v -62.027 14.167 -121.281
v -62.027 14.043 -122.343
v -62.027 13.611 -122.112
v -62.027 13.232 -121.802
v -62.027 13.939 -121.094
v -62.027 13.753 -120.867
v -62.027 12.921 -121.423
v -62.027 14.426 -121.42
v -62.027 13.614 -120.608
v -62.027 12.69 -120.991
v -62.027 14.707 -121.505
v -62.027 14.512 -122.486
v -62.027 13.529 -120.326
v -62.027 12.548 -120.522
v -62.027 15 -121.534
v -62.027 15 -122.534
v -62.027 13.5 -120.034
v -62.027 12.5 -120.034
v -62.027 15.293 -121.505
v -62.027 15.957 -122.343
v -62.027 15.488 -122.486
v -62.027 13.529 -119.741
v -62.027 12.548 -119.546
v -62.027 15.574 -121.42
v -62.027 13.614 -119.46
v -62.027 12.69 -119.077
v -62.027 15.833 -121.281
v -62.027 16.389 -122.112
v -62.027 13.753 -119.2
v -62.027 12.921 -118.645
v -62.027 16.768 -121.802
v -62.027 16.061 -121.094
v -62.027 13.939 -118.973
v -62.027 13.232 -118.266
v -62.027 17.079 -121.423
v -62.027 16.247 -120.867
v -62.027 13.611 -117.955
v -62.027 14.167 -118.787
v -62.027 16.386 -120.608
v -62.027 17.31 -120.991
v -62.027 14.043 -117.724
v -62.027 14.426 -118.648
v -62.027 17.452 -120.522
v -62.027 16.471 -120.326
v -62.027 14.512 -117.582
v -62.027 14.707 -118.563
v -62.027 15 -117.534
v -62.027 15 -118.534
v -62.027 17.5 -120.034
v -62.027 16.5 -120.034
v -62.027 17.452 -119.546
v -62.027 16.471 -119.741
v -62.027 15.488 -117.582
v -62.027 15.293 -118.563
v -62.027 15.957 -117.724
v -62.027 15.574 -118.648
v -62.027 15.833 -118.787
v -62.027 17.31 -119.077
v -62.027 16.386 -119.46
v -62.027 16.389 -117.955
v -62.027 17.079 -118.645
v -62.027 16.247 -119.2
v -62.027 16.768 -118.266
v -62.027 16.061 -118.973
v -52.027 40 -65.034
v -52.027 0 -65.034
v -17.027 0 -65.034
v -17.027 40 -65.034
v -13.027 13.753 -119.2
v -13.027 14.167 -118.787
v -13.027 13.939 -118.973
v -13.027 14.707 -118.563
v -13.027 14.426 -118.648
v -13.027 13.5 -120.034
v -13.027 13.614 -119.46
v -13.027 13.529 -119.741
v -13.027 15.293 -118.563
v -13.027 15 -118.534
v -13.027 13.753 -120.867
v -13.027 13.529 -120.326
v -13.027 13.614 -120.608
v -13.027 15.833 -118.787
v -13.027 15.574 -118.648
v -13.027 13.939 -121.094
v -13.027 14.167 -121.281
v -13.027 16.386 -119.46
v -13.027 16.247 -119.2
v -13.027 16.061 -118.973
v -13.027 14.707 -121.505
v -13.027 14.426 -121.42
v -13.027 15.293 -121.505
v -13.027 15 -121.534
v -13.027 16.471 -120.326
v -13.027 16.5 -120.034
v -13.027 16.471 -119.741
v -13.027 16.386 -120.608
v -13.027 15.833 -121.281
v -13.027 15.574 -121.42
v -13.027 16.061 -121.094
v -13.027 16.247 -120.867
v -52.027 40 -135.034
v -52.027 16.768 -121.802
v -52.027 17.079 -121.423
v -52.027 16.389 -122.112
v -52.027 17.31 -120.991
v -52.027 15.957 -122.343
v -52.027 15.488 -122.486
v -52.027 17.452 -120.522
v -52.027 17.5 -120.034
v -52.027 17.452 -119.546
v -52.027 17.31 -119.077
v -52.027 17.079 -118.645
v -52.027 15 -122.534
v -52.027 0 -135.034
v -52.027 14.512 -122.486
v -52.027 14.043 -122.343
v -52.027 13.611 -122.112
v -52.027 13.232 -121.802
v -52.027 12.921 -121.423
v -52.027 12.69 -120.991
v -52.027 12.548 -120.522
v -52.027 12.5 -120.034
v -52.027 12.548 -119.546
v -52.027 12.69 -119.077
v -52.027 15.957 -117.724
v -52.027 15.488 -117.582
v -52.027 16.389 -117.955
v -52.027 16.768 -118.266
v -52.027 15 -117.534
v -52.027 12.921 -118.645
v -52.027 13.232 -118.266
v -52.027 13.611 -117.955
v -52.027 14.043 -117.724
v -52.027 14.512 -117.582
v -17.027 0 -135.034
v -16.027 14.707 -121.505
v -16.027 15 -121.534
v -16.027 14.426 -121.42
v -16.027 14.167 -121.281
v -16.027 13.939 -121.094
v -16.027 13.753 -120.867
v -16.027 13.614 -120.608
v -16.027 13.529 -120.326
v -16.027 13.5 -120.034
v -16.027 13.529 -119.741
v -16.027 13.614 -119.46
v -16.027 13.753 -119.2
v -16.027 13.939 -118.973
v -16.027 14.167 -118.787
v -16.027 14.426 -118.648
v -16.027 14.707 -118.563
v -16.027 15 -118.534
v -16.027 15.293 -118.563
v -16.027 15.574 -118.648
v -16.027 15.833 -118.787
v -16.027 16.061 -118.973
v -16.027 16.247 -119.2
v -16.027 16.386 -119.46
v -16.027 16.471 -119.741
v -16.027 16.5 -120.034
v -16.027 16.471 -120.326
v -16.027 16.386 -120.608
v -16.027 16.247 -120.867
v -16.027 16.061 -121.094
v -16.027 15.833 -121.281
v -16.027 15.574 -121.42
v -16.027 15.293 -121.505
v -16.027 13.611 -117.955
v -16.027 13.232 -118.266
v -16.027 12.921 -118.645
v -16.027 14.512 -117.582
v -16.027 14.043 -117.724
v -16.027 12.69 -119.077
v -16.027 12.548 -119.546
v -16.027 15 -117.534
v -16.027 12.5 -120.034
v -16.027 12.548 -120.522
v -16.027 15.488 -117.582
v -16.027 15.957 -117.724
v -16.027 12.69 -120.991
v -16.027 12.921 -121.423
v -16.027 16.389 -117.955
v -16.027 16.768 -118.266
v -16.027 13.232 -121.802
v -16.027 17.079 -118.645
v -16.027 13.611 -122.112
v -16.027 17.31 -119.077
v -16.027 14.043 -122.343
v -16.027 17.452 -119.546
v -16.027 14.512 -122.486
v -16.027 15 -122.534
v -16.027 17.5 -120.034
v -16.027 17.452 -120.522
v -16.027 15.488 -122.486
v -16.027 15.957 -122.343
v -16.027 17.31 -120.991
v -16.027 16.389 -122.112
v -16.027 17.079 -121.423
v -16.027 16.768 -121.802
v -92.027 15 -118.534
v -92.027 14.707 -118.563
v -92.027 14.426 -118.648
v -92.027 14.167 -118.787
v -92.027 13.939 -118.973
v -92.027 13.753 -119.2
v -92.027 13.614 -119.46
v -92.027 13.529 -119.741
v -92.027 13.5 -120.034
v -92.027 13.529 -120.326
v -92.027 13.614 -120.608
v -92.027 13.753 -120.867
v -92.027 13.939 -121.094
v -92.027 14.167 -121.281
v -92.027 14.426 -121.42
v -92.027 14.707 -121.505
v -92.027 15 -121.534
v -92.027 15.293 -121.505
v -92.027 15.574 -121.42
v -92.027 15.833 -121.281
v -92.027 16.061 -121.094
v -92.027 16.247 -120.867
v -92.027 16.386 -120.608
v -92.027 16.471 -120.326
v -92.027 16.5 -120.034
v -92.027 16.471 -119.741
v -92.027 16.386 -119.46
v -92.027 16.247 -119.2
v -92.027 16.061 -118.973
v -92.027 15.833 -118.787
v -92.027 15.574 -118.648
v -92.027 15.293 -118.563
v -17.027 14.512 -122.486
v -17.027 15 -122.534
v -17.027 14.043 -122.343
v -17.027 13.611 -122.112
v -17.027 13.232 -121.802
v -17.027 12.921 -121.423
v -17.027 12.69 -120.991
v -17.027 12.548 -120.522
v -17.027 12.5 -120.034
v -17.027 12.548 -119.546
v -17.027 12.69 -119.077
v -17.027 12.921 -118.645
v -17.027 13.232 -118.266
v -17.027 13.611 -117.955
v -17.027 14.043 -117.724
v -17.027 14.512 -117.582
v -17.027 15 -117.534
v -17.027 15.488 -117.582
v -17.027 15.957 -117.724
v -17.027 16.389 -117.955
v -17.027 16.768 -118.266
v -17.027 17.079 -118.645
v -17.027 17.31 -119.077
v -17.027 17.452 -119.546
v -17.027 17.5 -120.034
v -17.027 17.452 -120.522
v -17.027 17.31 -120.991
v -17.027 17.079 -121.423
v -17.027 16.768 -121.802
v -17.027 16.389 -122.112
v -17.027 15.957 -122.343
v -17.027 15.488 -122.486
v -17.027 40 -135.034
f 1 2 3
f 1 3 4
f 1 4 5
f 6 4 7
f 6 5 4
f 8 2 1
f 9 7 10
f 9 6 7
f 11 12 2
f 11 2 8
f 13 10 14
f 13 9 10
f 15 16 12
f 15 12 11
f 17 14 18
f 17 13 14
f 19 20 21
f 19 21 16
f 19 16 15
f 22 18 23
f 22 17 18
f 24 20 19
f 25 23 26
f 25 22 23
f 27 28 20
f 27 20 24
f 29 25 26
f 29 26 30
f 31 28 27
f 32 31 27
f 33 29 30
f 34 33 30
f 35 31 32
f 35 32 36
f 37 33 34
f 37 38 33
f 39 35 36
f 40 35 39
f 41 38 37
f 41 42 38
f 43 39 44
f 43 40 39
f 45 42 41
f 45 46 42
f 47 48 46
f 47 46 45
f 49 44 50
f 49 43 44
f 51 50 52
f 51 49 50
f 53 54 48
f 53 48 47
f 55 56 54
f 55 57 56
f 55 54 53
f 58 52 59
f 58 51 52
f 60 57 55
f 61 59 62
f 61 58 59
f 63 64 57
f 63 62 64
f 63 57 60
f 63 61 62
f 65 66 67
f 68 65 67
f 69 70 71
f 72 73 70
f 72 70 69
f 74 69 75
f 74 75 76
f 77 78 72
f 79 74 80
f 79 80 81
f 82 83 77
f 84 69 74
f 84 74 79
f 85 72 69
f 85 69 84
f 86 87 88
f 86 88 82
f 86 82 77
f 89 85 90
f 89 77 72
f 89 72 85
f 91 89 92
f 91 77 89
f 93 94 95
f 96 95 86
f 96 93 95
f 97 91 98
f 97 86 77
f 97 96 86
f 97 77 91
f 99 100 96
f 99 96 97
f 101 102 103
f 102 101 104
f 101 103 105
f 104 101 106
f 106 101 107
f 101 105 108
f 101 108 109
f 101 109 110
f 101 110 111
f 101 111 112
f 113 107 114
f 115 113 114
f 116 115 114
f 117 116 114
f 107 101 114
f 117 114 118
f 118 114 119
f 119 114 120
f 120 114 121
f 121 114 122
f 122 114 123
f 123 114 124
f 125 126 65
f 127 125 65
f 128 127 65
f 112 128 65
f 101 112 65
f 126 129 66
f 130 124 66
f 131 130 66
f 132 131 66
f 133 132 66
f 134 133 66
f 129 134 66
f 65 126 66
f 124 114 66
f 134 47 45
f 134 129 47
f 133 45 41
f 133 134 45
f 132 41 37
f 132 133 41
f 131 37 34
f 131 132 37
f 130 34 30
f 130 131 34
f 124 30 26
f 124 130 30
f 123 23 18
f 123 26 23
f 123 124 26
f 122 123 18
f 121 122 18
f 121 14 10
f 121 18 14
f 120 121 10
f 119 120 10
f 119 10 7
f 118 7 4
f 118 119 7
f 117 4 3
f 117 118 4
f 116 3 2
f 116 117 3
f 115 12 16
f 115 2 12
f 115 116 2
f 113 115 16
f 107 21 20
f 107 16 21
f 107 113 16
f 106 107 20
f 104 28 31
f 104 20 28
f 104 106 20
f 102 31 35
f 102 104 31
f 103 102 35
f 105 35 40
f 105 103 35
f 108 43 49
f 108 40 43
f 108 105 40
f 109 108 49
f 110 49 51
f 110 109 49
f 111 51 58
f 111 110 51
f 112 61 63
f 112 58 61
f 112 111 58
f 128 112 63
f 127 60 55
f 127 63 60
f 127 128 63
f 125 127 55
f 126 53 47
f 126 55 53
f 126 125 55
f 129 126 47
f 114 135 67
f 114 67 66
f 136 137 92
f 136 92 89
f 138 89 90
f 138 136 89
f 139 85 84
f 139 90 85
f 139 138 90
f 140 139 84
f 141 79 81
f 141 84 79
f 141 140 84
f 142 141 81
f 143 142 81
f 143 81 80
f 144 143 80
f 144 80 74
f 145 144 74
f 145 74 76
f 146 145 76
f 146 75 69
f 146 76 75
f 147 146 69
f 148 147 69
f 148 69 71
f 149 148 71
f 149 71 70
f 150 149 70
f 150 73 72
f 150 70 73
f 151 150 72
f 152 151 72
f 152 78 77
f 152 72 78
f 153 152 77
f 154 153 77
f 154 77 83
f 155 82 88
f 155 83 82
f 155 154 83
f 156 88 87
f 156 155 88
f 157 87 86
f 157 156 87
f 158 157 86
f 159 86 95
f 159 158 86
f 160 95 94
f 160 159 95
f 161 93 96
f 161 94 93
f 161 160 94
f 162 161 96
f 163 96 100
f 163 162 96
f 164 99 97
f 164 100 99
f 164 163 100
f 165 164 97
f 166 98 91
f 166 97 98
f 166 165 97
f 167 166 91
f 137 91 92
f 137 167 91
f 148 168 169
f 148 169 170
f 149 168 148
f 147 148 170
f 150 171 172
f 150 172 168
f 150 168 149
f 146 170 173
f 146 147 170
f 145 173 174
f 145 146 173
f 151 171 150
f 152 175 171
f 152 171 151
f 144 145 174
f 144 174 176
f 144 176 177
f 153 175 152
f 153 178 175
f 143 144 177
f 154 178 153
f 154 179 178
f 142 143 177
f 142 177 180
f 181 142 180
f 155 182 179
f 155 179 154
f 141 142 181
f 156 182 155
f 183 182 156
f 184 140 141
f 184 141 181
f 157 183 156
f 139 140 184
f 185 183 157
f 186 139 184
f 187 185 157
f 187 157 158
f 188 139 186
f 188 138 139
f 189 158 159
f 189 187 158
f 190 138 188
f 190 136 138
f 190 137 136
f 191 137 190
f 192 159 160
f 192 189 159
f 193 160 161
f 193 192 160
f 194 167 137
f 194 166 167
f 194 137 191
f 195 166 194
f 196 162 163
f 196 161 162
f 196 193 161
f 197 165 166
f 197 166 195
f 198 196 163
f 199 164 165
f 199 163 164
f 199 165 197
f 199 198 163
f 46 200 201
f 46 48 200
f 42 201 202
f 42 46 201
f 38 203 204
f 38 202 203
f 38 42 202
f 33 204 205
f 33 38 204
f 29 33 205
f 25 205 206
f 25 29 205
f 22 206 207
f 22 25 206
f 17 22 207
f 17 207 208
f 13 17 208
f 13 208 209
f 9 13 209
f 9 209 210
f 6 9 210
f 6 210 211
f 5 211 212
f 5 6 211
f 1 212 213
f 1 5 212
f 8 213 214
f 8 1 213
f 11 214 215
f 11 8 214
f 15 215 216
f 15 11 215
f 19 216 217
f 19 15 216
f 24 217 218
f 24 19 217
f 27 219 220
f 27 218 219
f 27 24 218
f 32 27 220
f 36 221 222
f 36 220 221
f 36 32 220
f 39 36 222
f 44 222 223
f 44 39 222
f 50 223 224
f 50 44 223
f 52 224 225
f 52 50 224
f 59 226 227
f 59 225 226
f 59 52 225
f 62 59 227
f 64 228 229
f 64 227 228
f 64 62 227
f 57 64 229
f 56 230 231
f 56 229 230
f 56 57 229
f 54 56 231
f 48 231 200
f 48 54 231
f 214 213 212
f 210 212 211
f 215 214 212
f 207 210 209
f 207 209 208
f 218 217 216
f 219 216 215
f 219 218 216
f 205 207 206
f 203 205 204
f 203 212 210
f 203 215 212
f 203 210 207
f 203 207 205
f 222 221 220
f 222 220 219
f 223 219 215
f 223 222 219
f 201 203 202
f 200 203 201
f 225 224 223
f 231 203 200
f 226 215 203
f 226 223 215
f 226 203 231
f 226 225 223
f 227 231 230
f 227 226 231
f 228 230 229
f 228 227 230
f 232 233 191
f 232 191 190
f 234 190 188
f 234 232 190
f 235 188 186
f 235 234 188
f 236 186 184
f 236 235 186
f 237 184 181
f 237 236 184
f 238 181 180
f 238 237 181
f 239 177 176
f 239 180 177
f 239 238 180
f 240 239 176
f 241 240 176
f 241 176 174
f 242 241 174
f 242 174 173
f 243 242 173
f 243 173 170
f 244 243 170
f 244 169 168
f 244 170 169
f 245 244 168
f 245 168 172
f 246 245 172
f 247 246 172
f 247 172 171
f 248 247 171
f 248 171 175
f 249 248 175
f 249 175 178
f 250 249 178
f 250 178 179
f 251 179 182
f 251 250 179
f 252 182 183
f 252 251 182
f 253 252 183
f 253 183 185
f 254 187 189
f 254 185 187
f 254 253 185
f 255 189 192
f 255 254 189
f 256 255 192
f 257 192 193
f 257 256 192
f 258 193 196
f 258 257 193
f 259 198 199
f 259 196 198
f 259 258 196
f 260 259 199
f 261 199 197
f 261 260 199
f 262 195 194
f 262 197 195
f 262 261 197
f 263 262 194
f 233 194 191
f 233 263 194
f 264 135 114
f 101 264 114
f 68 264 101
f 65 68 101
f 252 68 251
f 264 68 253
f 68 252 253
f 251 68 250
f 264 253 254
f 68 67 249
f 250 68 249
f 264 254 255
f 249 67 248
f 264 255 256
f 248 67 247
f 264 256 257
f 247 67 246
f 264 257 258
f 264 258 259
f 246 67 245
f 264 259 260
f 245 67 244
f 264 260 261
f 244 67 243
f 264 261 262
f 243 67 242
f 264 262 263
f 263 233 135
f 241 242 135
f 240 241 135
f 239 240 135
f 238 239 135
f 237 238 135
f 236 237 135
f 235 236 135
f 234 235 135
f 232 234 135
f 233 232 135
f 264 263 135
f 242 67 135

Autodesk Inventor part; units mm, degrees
ref_plane "YZ Plane" through (0, 0, 0) normal (1, 0, 0) x (0, 1, 0)
ref_plane "XZ Plane" through (0, 0, 0) normal (0, 1, 0) x (-1, 0, 0)
ref_plane "XY Plane" through (0, 0, 0) normal (0, 0, 1) x (1, 0, 0)
sketch "Skizze1" plane through (0, 0, 0) normal (0, 1, 0) x (-1, 0, 0)
  line L0 (52.027, -65.0338) -> (17.027, -65.0338)
  line L1 (17.027, -65.0338) -> (17.027, -135.0338)
  line L2 (17.027, -135.0338) -> (52.027, -135.0338)
  line L3 (52.027, -135.0338) -> (52.027, -65.0338)
  point P0 (0, 0)
  dimension "d0" = 70
  dimension "d1" = 35
extrude "Extrusion1" add sketch "Skizze1" along normal blind 40
sketch "Skizze2" plane through (-17.027, 0, -65.0338) normal (1, 0, 0) x (0, 0, -1)
  circle A0 centre (55, 15) radius 1.5
  circle A1 centre (55, 15) radius 2.5
  line L0 (0, 0) -> (70, 0) projected
  line L1 (70, 0) -> (70, 40) projected
  point P0 (-65.0338, 0)
  dimension "d4" = 3
  dimension "d5" = 5
  dimension "d6" = 15
  dimension "d7" = 15
extrude "Extrusion2" add sketch "Skizze2" along normal blind 4 contours A0
extrude "Extrusion3" add sketch "Skizze2" along normal blind 1
sketch "Skizze3" plane through (-52.027, 0, -135.0338) normal (-1, 0, 0) x (0, 0, 1)
  circle A0 centre (15, 15) radius 1.5
  circle A1 centre (15, 15) radius 2.5
  line L0 (0, 0) -> (0, 40) projected
  line L1 (0, 0) -> (70, 0) projected
  point P0 (-65.0338, 0)
  dimension "d12" = 3
  dimension "d13" = 5
  dimension "d16" = 15
  dimension "d17" = 15
extrude "Extrusion4" add sketch "Skizze3" along normal blind 40 contours A0
extrude "Extrusion5" add sketch "Skizze3" along normal blind 10
properties part number "Motor_links"
